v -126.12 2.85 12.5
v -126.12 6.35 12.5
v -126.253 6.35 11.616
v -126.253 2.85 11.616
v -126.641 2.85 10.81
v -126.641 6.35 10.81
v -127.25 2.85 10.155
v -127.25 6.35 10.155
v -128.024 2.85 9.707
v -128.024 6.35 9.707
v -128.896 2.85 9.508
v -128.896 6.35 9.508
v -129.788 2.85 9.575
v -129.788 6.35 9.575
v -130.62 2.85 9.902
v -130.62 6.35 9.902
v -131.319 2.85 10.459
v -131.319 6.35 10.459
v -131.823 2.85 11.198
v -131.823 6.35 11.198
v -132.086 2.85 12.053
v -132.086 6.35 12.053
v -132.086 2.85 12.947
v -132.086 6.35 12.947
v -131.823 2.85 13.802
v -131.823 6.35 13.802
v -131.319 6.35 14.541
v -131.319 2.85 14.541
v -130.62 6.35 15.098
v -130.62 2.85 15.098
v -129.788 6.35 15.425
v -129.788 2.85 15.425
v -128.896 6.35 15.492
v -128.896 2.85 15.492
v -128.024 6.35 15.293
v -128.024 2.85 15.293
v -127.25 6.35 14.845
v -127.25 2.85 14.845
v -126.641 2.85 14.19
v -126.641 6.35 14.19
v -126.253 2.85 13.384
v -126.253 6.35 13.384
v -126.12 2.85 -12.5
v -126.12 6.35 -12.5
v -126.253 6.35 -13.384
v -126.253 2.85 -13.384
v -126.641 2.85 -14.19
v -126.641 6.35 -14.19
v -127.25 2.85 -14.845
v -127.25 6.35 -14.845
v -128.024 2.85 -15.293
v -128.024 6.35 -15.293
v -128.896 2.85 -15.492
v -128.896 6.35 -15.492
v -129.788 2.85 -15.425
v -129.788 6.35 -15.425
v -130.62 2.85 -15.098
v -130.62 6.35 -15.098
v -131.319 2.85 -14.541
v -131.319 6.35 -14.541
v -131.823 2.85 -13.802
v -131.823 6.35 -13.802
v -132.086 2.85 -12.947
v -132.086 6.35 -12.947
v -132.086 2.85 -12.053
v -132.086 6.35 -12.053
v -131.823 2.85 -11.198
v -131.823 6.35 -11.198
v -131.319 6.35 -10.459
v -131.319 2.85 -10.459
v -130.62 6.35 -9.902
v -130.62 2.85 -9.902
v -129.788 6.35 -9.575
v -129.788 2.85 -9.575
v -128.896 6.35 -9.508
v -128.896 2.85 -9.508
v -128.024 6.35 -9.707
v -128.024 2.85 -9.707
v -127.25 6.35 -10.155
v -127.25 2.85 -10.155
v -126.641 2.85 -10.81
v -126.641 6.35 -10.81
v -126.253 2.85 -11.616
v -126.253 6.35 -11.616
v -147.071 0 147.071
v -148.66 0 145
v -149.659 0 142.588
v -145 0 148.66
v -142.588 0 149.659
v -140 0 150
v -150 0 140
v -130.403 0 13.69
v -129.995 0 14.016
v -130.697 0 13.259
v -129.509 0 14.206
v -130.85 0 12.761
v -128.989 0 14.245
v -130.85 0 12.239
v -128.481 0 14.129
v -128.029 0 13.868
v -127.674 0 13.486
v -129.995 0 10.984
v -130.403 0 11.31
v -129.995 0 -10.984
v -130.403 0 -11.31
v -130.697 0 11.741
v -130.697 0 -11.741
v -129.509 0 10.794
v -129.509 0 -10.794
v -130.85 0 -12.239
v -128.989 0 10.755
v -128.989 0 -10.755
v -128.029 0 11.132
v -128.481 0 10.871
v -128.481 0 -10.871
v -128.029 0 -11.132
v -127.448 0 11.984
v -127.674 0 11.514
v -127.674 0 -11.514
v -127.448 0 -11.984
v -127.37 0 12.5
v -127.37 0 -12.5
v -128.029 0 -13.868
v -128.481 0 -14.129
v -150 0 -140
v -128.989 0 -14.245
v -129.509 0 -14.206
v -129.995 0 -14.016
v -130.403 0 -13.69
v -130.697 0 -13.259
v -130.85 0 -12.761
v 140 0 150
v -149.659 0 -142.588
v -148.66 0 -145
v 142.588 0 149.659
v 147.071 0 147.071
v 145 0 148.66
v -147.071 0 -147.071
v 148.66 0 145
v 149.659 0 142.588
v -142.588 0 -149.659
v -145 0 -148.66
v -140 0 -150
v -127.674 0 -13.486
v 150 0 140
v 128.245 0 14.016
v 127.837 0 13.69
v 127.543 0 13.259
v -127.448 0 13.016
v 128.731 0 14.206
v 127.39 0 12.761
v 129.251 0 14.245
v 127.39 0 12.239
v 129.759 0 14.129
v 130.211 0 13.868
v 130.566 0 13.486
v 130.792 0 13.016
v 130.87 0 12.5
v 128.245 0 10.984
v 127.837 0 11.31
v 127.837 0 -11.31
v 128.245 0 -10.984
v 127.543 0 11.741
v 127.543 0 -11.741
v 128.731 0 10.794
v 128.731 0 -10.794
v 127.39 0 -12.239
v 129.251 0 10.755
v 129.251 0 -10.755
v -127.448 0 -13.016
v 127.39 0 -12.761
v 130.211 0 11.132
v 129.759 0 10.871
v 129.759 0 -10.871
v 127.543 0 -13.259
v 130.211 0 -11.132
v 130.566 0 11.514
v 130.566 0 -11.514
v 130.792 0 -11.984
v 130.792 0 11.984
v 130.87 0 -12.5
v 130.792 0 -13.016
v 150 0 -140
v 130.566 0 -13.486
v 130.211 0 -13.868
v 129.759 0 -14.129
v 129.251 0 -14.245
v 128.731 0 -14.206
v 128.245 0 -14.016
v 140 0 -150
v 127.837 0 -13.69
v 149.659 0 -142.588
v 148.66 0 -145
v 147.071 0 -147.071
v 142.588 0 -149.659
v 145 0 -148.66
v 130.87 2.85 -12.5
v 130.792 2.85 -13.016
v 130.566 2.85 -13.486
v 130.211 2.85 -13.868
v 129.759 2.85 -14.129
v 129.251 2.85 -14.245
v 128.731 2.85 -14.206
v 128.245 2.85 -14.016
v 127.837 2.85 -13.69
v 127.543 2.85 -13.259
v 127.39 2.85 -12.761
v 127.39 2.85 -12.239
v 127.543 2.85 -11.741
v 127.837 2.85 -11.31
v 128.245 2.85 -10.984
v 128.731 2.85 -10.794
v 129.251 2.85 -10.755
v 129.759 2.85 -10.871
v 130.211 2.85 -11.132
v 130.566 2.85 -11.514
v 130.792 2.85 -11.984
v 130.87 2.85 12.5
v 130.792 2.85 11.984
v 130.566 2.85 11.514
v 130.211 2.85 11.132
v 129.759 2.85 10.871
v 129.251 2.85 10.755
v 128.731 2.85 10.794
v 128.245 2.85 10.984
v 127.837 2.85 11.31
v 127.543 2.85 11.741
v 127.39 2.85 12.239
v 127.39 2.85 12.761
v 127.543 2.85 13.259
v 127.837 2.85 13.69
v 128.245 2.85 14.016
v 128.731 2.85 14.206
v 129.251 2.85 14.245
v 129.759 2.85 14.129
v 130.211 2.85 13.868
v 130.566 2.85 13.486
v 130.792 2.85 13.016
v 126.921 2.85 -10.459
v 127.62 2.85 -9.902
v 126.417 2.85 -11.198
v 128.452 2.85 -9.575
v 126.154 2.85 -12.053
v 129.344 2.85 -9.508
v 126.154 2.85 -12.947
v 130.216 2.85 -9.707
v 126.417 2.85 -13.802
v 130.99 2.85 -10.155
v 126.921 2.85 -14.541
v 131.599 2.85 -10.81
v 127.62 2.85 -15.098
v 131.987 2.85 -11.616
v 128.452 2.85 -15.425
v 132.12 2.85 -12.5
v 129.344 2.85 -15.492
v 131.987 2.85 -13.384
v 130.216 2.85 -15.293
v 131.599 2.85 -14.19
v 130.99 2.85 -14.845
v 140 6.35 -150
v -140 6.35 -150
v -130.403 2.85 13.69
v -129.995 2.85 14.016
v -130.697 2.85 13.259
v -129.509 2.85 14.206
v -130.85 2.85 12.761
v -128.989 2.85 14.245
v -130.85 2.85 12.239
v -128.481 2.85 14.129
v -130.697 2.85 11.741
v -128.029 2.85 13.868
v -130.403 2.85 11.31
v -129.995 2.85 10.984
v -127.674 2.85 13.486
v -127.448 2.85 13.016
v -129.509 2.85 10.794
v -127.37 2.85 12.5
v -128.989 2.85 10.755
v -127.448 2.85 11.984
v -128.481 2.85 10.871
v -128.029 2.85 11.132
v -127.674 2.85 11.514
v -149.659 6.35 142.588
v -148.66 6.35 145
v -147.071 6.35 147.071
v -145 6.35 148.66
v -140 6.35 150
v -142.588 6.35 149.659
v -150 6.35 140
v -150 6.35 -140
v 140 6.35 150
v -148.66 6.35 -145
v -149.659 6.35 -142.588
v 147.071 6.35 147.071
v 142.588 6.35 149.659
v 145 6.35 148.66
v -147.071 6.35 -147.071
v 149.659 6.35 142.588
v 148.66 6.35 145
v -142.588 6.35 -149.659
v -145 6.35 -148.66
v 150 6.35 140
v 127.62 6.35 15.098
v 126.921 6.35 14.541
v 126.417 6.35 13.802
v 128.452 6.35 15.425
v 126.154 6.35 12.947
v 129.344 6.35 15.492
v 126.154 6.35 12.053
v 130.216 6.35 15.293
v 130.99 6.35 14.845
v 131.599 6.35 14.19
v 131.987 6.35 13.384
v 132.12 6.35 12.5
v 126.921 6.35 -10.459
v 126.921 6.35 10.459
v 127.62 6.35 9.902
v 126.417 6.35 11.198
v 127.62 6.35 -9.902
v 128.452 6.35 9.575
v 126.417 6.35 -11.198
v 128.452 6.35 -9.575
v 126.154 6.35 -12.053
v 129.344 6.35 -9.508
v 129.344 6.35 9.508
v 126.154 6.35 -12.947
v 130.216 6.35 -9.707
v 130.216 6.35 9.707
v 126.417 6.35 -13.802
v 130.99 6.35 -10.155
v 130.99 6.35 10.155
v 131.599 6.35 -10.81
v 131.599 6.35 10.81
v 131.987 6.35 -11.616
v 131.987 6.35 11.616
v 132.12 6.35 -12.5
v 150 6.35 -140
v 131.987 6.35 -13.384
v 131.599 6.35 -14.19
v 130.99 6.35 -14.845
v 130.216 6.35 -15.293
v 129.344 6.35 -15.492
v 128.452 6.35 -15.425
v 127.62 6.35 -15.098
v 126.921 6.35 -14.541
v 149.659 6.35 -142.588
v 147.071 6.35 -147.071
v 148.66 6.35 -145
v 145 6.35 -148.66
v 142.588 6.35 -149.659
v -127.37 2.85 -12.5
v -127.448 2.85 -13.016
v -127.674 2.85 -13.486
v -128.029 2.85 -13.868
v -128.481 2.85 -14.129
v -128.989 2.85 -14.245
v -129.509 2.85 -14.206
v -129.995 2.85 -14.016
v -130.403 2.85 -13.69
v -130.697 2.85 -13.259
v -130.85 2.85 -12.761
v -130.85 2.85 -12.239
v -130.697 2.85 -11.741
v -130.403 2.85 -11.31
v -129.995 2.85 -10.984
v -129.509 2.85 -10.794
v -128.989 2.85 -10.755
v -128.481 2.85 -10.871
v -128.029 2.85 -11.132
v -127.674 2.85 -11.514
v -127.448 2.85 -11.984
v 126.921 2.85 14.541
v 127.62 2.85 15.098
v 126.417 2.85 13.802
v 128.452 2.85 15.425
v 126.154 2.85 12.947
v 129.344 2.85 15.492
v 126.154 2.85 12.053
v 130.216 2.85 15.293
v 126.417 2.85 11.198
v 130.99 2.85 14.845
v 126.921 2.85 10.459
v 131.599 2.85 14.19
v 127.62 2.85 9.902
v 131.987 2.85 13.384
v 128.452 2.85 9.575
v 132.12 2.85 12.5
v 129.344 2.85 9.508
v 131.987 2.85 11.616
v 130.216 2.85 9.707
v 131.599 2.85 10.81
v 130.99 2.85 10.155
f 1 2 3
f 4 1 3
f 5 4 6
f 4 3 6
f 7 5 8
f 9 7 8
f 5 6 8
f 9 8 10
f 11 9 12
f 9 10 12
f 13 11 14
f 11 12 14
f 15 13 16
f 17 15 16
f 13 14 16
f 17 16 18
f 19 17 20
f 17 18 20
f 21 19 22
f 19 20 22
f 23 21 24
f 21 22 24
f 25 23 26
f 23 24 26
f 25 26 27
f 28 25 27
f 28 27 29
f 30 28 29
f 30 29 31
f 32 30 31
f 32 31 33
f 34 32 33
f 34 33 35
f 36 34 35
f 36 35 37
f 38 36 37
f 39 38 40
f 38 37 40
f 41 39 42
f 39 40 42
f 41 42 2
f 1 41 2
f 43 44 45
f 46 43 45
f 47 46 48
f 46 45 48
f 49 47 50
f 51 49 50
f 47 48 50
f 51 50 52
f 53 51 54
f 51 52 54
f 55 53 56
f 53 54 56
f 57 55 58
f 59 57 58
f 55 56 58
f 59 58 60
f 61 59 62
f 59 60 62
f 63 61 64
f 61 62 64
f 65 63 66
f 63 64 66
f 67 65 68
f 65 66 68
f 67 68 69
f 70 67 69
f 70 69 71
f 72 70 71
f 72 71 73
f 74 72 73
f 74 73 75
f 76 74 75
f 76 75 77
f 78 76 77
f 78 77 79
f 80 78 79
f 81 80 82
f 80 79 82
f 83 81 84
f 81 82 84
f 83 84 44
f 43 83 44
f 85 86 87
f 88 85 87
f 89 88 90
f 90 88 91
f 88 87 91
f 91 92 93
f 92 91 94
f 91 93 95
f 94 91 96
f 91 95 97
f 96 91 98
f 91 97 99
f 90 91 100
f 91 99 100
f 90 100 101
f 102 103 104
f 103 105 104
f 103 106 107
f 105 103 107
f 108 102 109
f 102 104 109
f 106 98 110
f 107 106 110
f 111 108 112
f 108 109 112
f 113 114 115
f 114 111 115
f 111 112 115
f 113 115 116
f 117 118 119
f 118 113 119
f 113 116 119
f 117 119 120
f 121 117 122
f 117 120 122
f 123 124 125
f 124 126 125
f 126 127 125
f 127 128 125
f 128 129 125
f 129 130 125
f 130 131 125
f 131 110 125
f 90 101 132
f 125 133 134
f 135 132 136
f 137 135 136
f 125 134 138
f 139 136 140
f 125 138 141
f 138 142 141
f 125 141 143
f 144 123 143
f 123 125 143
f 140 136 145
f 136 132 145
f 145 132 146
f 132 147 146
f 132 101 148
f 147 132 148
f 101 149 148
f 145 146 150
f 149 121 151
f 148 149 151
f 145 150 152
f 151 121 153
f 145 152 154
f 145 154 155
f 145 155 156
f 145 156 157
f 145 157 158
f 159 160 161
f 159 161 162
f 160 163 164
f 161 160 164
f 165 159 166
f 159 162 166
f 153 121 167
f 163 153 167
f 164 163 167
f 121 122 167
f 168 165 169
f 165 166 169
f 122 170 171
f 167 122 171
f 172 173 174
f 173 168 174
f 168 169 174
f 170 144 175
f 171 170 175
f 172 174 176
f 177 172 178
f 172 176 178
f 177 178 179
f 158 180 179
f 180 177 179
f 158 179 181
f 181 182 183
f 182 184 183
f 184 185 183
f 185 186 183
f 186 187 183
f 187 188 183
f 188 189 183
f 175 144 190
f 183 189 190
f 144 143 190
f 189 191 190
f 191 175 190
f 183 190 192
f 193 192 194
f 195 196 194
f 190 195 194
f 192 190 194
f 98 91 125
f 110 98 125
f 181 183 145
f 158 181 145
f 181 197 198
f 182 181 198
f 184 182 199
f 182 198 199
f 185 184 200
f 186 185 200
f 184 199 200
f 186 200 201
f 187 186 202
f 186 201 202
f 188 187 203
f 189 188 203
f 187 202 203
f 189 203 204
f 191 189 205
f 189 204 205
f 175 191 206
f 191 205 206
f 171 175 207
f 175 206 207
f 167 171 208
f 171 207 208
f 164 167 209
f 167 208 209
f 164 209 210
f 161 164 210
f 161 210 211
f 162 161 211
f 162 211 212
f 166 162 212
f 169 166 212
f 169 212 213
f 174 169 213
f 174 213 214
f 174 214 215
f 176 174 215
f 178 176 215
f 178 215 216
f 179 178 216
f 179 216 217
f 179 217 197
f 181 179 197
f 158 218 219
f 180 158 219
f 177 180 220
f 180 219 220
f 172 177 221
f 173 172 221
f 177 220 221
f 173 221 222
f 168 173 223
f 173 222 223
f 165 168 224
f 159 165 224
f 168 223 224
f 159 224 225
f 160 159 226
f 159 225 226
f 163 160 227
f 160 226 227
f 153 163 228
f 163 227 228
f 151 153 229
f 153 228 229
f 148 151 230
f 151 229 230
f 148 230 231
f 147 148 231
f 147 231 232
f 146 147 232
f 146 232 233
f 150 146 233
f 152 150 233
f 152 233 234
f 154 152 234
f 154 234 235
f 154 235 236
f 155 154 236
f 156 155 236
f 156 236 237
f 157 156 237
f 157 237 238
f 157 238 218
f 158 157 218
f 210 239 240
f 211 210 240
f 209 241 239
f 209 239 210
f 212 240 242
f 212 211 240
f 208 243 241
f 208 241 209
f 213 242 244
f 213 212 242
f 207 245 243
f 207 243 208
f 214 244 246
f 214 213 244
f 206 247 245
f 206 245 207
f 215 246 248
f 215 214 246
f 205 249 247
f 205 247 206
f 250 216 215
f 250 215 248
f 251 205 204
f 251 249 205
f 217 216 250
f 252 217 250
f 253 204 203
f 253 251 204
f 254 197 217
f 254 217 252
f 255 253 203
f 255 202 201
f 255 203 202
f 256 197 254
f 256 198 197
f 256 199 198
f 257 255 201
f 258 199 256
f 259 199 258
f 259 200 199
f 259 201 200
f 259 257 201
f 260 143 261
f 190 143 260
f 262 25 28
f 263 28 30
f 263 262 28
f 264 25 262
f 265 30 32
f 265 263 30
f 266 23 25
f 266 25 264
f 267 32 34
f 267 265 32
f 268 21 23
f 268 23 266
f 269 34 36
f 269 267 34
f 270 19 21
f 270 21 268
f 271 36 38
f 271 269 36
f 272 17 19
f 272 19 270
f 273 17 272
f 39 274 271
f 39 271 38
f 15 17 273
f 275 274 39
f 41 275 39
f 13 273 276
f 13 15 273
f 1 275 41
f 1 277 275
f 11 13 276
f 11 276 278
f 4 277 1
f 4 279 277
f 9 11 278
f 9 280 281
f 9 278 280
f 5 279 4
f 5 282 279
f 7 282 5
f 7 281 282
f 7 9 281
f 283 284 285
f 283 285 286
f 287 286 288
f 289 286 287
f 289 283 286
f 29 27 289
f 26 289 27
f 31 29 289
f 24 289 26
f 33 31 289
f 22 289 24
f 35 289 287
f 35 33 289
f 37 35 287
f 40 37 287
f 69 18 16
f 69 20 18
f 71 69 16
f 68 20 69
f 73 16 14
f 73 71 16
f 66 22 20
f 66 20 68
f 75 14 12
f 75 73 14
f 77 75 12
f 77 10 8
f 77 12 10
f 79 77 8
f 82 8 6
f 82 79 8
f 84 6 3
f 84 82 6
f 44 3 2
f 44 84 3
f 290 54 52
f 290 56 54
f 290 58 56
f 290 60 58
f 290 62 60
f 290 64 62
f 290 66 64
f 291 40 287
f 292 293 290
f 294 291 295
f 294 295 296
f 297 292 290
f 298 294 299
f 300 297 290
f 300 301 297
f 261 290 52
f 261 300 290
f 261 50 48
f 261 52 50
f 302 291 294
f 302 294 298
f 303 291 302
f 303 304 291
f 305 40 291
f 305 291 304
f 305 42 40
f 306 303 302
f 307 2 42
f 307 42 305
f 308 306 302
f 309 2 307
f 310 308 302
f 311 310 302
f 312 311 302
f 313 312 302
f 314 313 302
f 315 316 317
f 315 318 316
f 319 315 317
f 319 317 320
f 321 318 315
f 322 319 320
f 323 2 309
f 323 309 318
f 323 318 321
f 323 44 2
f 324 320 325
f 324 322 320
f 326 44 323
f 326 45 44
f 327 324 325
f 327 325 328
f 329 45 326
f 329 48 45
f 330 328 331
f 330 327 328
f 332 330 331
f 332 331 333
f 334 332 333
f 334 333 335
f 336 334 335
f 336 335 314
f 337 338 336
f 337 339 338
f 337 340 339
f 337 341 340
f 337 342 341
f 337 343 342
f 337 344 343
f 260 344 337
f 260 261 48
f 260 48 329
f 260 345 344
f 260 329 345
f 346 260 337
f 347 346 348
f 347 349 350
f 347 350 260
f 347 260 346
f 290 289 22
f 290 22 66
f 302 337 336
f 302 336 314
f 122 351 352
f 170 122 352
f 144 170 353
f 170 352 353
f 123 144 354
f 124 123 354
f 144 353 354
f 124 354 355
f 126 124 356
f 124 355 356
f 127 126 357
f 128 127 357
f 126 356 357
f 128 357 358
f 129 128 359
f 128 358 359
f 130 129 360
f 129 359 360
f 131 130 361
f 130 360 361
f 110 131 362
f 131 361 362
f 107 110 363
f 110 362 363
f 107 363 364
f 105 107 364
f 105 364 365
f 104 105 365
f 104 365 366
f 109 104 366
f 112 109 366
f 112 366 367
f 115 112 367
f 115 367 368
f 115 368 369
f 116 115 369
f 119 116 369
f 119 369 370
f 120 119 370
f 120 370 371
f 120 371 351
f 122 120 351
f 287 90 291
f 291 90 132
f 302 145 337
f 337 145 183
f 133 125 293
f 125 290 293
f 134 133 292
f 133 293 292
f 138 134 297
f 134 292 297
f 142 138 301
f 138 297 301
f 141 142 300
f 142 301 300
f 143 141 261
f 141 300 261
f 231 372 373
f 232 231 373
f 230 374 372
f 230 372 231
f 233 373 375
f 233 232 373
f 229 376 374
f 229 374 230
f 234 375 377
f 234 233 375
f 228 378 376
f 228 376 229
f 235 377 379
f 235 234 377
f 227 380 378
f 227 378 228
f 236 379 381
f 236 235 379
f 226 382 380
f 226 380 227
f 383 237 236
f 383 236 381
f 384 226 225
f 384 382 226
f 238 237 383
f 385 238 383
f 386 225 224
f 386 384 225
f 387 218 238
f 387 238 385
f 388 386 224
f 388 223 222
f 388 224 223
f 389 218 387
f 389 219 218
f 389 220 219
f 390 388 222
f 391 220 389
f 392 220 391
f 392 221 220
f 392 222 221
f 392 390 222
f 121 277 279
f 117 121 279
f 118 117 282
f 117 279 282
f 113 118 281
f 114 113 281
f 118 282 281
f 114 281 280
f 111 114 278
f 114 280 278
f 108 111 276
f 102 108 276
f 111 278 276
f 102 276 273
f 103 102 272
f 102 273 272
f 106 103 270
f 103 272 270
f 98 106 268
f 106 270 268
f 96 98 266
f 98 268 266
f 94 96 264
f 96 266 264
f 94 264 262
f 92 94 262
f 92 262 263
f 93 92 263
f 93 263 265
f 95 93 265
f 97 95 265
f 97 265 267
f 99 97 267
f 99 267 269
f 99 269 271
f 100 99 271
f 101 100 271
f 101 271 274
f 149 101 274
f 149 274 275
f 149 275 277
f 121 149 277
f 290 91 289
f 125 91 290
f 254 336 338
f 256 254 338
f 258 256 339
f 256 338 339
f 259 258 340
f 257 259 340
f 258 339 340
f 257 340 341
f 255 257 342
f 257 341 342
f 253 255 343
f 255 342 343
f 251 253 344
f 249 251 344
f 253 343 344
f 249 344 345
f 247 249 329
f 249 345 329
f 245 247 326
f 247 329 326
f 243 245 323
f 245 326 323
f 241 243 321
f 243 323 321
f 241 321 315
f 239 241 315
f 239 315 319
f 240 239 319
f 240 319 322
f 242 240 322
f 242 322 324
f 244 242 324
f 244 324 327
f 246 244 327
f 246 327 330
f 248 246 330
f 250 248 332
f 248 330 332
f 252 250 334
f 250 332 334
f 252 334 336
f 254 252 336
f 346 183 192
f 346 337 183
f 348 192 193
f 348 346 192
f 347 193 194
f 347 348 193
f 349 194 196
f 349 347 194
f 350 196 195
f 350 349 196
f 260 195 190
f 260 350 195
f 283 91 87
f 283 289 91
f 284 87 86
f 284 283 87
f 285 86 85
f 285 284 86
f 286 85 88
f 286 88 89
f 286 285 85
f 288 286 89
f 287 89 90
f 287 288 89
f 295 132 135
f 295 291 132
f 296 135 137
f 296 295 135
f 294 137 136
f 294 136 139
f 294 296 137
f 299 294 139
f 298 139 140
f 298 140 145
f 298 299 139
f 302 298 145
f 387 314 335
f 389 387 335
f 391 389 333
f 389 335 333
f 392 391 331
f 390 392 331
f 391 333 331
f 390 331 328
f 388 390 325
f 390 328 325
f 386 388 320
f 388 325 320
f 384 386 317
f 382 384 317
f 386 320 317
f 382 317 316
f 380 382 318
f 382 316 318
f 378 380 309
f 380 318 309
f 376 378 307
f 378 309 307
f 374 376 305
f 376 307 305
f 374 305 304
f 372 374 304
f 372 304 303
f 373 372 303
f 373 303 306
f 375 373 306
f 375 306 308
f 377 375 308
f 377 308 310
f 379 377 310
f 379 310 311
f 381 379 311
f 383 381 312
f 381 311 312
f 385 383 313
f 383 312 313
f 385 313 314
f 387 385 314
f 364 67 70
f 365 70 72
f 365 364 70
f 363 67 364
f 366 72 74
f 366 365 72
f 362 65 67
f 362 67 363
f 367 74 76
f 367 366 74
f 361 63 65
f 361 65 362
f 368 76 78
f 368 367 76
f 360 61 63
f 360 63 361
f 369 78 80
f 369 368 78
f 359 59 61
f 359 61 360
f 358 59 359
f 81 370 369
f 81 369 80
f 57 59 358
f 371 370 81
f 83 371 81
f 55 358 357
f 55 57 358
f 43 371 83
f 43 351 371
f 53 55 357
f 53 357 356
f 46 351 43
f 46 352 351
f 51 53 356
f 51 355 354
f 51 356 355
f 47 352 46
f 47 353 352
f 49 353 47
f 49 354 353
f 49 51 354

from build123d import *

# Parameters (mm, degrees)
SKETCH1_W            = 300
SKETCH1_H            = 300
BOSS_EXTRUDE1_DEPTH  = 6.35
FILLET1_R            = 10
SKETCH2_R            = 1.75
CUT_EXTRUDE1_DEPTH   = 7.35
SKETCH3_R            = 3
CUT_EXTRUDE2_DEPTH   = 3.5
LPATTERN1_COUNT      = 2
LPATTERN1_PITCH      = 25
LPATTERN1_COUNT_DIR2 = 2
LPATTERN1_PITCH_DIR2 = 258.24


with BuildPart() as part:
    # Sketch1 → Boss-Extrude1 (new body)
    with BuildSketch(Plane(origin=(0, 0, 0), x_dir=(1, 0, 0), z_dir=(0, 1, 0))):
        Rectangle(SKETCH1_W, SKETCH1_H)
    extrude(amount=BOSS_EXTRUDE1_DEPTH)

    # Fillet1
    fillet1_edges = [part.edges().sort_by_distance(p)[0] for p in [
        (150, 3.175, 150),
        (-150, 3.175, 150),
        (-150, 3.175, -150),
        (150, 3.175, -150),
    ]]
    fillet(fillet1_edges, radius=FILLET1_R)

    # Sketch2 → Cut-Extrude1 (cut, through all)
    with BuildSketch(Plane(origin=(0, 6.35, 0), x_dir=(1, 0, 0), z_dir=(0, 1, 0))):
        with Locations((-129.12, 12.5)):
            Circle(SKETCH2_R)
        with Locations((-129.12, -12.5)):
            Circle(SKETCH2_R)
        with Locations((129.12, 12.5)):
            Circle(SKETCH2_R)
        with Locations((129.12, -12.5)):
            Circle(SKETCH2_R)
    extrude(amount=-CUT_EXTRUDE1_DEPTH, mode=Mode.SUBTRACT)

    # Sketch3 → Cut-Extrude2 (cut)
    with BuildSketch(Plane(origin=(0, 6.35, 0), x_dir=(1, 0, 0), z_dir=(0, 1, 0))):
        with Locations((-129.12, 12.5)):
            Circle(SKETCH3_R)
    cut_extrude2 = extrude(amount=-CUT_EXTRUDE2_DEPTH, mode=Mode.SUBTRACT)

    # LPattern1: Cut-Extrude2 2 × 2
    with Locations(*[(j * LPATTERN1_PITCH_DIR2, 0, i * LPATTERN1_PITCH) for i in range(LPATTERN1_COUNT) for j in range(LPATTERN1_COUNT_DIR2) if (i, j) != (0, 0)]):
        add(cut_extrude2, mode=Mode.SUBTRACT)


solid = part.part
